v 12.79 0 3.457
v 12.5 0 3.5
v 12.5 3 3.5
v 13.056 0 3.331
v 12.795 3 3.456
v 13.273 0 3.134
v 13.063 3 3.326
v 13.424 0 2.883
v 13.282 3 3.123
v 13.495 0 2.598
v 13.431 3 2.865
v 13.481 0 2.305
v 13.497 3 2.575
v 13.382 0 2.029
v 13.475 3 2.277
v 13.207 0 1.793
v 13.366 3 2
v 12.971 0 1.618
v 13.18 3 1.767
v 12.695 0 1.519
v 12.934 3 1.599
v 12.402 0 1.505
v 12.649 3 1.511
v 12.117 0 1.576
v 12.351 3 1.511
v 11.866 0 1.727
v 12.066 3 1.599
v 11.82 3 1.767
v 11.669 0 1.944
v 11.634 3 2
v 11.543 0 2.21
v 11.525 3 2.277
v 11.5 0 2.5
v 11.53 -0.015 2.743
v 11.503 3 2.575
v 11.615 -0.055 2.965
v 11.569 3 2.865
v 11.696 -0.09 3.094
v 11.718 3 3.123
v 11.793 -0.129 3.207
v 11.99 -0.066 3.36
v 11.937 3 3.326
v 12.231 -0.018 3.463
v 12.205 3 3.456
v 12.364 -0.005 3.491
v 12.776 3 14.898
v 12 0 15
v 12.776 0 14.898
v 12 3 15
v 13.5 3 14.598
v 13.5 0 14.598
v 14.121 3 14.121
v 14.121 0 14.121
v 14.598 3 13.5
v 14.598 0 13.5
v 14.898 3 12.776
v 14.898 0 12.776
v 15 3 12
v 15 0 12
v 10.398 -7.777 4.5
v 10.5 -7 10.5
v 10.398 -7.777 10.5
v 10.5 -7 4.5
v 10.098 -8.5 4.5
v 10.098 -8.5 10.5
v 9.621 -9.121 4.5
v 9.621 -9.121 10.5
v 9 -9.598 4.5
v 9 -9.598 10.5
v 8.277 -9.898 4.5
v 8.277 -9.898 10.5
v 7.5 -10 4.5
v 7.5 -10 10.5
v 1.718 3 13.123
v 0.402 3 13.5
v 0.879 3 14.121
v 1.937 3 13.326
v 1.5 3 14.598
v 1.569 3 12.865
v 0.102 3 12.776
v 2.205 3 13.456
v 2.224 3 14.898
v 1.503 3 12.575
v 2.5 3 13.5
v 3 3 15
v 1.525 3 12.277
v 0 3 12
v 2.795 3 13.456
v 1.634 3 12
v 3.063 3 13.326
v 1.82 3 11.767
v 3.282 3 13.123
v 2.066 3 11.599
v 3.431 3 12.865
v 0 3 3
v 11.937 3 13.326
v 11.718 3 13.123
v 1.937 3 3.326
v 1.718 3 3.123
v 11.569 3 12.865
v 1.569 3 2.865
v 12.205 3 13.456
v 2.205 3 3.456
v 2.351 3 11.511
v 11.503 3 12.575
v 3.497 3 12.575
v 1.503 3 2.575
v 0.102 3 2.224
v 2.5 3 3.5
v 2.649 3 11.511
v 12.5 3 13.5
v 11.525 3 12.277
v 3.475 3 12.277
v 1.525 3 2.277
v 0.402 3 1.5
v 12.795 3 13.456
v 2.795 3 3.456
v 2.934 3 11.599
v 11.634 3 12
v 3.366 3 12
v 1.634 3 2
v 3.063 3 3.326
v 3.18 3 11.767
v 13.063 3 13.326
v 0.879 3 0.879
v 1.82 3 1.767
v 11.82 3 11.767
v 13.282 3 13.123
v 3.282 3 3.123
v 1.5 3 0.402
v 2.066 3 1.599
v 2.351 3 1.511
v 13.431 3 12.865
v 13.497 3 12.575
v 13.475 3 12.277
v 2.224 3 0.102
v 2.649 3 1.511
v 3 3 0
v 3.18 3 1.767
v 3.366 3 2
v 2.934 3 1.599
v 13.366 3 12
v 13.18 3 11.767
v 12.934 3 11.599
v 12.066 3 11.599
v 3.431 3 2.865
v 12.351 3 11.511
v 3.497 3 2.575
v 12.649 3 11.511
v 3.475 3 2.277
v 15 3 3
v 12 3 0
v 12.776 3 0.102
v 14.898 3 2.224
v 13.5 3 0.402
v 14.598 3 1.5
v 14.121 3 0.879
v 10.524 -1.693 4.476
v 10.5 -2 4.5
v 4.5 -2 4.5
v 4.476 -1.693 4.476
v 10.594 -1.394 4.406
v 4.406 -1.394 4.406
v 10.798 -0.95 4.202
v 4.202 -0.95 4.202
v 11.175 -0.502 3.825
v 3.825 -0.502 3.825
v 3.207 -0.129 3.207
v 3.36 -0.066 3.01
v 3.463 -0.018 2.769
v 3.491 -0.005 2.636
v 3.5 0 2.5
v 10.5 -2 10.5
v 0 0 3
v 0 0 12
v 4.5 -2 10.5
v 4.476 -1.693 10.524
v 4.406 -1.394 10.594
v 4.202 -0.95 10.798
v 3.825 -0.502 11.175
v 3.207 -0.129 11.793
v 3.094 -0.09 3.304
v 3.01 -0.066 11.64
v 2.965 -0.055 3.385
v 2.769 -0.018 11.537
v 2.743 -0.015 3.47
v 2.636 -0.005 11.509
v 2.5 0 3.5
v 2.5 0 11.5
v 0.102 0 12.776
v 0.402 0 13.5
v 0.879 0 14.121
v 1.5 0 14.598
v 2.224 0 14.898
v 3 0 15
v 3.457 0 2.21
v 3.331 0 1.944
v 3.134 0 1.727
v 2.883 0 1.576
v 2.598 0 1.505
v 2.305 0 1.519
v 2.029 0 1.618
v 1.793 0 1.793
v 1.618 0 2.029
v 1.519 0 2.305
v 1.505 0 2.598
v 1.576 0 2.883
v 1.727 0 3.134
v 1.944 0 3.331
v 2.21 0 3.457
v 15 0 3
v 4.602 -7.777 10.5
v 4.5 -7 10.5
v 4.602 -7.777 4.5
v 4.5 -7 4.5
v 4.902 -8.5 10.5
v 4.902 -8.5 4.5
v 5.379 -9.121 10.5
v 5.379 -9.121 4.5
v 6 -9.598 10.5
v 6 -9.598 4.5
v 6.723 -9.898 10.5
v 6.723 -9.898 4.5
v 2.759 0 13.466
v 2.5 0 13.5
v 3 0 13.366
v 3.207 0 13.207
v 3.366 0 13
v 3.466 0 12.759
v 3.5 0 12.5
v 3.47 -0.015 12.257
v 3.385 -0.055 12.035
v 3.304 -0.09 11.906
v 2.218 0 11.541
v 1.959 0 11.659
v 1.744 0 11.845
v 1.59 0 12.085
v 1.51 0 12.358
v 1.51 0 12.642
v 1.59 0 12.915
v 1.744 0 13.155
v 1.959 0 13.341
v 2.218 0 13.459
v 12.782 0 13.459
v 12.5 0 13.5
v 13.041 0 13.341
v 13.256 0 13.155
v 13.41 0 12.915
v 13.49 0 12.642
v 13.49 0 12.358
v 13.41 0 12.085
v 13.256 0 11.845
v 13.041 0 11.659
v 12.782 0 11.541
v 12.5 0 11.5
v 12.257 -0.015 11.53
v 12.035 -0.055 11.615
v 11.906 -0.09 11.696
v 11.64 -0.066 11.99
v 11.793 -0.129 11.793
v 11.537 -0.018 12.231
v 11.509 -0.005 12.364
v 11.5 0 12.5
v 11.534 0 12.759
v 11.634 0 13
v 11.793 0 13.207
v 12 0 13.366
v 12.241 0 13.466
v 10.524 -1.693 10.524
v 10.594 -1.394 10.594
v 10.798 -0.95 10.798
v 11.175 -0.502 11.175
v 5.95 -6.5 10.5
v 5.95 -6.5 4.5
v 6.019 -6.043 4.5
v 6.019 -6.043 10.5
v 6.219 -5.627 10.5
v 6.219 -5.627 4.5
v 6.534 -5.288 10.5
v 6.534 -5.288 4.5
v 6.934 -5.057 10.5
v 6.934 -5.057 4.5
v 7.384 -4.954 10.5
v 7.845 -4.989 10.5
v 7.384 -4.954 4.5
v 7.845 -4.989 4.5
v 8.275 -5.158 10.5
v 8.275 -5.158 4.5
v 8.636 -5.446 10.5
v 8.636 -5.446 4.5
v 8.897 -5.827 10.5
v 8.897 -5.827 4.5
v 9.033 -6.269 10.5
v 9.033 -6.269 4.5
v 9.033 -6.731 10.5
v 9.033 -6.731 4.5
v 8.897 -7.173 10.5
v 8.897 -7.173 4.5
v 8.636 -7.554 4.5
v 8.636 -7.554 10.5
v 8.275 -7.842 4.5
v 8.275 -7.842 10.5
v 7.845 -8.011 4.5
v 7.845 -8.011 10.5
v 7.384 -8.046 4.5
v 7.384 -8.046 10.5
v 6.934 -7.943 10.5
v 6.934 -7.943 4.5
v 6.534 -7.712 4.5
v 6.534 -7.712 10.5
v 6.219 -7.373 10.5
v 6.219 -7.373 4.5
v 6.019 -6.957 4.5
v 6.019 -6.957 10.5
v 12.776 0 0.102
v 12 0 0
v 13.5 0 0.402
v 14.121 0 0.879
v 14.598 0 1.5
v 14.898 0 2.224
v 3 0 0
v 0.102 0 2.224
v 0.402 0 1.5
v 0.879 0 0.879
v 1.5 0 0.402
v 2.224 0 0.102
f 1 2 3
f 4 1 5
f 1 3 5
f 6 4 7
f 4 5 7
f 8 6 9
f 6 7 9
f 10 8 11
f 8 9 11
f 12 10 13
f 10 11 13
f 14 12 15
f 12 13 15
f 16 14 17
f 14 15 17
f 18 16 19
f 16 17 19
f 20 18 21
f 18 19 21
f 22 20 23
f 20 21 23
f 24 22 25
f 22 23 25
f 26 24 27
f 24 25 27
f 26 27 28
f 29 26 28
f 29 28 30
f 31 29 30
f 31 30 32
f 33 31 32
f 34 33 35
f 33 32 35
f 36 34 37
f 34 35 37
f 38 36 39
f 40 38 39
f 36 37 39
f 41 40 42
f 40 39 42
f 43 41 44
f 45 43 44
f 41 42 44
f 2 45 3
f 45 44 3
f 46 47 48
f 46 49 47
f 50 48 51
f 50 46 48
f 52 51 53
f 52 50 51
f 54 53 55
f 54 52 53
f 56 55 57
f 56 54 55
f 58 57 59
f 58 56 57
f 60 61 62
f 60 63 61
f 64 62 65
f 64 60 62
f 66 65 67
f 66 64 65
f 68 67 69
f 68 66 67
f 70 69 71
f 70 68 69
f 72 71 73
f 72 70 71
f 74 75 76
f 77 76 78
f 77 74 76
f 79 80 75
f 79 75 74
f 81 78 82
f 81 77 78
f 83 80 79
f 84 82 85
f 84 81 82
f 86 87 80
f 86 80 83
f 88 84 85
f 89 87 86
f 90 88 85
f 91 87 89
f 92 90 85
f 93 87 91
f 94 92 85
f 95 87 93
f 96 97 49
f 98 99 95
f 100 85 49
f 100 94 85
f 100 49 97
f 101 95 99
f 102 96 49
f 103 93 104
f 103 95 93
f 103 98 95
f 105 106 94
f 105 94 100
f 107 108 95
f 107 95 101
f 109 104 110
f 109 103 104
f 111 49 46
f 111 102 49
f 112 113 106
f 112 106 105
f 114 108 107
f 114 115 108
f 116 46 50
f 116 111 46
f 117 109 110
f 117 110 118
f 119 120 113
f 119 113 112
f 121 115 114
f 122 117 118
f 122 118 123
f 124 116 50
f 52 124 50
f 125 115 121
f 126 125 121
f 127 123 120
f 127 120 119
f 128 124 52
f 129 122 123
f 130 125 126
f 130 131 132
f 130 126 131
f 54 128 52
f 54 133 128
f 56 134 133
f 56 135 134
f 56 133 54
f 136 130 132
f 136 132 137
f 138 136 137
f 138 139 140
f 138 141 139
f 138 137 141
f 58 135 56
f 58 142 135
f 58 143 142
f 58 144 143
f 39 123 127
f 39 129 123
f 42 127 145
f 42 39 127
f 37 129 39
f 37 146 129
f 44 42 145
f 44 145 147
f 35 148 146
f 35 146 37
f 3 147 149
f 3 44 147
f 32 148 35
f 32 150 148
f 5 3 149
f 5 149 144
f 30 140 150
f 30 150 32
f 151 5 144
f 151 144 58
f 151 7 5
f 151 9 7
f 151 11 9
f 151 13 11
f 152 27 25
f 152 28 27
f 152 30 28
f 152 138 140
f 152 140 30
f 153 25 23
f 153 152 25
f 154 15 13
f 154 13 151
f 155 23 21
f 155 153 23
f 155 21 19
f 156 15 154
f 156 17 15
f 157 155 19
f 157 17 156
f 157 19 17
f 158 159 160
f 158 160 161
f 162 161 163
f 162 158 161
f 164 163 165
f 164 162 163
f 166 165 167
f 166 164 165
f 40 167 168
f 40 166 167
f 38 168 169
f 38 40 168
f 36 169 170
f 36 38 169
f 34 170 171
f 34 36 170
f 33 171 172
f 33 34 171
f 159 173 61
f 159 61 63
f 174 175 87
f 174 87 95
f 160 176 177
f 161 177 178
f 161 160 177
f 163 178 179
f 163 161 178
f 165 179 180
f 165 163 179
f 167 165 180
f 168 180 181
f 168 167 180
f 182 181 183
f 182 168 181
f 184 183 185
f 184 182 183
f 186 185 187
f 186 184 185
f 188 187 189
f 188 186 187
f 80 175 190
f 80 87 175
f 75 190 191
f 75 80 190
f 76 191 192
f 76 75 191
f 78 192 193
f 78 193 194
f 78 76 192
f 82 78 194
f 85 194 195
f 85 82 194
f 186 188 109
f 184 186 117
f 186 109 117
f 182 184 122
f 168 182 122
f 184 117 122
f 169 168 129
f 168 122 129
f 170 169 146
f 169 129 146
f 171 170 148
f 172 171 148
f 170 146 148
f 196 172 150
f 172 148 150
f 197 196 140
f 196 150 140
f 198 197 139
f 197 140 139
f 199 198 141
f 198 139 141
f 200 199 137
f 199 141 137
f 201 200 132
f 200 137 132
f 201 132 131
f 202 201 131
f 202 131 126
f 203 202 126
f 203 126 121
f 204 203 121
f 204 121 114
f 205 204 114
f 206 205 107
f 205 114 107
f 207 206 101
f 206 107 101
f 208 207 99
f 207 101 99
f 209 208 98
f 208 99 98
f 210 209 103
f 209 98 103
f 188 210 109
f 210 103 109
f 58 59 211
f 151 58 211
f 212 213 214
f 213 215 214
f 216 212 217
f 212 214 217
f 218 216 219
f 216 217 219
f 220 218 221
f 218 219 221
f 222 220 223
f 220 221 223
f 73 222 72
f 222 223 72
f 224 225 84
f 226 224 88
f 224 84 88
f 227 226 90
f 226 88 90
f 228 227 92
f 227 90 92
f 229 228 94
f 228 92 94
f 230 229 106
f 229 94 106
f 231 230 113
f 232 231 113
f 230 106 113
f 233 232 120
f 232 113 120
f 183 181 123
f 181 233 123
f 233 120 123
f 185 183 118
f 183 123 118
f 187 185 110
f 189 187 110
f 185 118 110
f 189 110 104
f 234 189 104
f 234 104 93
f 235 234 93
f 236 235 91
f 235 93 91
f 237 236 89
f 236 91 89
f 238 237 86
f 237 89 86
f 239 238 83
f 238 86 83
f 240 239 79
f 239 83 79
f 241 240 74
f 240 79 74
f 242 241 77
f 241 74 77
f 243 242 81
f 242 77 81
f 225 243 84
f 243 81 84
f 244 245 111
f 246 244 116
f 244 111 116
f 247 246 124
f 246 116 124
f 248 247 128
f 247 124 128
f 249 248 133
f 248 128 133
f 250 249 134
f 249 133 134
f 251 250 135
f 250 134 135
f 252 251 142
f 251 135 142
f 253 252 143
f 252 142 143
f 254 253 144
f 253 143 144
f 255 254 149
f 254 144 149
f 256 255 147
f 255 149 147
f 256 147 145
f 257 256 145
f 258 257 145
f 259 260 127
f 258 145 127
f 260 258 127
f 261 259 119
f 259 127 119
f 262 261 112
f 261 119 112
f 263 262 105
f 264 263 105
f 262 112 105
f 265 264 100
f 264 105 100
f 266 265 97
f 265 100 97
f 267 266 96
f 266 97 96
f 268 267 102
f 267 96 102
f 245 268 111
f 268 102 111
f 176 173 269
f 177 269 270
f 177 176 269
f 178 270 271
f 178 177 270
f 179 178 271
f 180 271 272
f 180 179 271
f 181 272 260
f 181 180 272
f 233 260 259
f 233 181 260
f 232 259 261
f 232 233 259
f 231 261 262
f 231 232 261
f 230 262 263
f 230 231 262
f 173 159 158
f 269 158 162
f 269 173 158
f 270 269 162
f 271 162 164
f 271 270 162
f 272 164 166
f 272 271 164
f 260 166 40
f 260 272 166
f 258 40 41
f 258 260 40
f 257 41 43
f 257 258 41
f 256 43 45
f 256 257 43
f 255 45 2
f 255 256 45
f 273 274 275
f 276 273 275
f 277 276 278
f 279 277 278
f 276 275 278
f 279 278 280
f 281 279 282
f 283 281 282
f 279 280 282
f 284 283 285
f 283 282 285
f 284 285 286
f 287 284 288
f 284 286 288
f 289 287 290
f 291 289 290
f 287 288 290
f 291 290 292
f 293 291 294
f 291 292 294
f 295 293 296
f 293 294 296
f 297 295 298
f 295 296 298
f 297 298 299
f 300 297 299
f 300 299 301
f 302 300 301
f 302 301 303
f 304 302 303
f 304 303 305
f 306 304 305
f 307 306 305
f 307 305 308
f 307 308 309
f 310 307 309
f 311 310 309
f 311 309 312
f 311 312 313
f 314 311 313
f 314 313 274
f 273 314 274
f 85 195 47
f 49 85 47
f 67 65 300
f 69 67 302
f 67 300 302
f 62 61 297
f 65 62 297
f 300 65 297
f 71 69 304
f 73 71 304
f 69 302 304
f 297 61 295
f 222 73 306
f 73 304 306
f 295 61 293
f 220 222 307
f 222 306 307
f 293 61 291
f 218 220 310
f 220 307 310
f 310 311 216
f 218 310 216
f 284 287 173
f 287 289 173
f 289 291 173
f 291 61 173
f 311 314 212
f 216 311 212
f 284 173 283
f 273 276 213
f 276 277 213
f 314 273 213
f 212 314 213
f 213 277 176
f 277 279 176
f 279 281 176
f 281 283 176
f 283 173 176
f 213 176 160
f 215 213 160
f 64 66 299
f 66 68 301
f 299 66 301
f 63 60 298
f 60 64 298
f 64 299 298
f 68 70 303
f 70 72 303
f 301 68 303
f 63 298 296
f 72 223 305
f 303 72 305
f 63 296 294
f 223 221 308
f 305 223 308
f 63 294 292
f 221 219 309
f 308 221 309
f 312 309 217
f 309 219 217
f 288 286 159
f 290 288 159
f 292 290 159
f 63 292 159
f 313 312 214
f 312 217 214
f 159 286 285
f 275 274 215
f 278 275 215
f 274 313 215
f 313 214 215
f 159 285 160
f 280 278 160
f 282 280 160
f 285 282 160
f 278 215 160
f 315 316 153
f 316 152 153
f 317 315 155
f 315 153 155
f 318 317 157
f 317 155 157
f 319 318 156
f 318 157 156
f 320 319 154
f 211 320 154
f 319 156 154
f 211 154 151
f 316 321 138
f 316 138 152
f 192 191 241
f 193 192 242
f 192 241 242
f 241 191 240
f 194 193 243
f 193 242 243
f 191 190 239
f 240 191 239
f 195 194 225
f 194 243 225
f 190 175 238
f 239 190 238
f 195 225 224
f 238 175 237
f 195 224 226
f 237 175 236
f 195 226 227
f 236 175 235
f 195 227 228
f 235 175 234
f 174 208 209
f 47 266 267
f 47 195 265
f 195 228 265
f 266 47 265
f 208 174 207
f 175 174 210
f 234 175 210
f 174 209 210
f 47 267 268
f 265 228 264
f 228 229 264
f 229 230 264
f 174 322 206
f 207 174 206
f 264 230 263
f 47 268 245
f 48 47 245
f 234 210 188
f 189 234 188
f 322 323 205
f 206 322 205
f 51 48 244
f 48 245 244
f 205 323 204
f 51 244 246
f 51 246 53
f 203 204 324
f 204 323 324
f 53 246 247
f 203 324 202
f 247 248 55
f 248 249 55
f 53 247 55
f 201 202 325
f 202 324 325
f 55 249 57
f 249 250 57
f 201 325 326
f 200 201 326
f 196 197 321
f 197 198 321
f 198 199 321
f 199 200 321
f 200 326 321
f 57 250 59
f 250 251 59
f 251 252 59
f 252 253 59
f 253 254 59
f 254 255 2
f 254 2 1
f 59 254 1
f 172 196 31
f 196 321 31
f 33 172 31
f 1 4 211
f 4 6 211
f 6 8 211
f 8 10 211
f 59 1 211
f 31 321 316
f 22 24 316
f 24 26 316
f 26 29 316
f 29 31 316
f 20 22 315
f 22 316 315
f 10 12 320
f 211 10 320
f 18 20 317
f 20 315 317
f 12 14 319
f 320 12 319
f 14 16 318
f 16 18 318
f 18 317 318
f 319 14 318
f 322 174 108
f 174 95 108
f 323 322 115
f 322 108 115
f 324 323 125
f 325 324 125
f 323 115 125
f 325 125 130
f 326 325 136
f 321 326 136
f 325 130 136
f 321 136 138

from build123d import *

# Parameters (mm, degrees)
SKETCH1_W           = 15
SKETCH1_H           = 15
BOSS_EXTRUDE1_DEPTH = 3
SKETCH3_R           = 1
CUT_EXTRUDE1_DEPTH  = 22.424285286
FILLET1_R           = 3
SKETCH4_W           = 6
SKETCH4_H           = 6
BOSS_EXTRUDE2_DEPTH = 10
SKETCH5_R           = 1.55
CUT_EXTRUDE2_DEPTH  = 21.862646045
FILLET2_R           = 3
FILLET3_R           = 2


# Some blends are built 0.0001 mm under size
with BuildPart() as part:
    # Sketch1 → Boss-Extrude1 (new body)
    with BuildSketch(Plane(origin=(0, 0, 0), x_dir=(1, 0, 0), z_dir=(0, 1, 0))):
        with Locations((7.5, -7.5)):
            Rectangle(SKETCH1_W, SKETCH1_H)
    extrude(amount=BOSS_EXTRUDE1_DEPTH)

    # Sketch3 → Cut-Extrude1 (cut, through all)
    with BuildSketch(Plane(origin=(0, 3, 0), x_dir=(1, 0, 0), z_dir=(0, 1, 0))):
        with Locations(Location((2.5, -12.5, 0), (0, 0, 270))):
            Circle(SKETCH3_R)
        with Locations(Location((12.5, -12.5, 0), (0, 0, 270))):
            Circle(SKETCH3_R)
        with Locations(Location((12.5, -2.5, 0), (0, 0, 270))):
            Circle(SKETCH3_R)
        with Locations(Location((2.5, -2.5, 0), (0, 0, 270))):
            Circle(SKETCH3_R)
    extrude(amount=-CUT_EXTRUDE1_DEPTH, mode=Mode.SUBTRACT)

    # Fillet1
    fillet1_edges = [part.edges().sort_by_distance(p)[0] for p in [
        (0, 1.5, 0),
        (15, 1.5, 0),
        (15, 1.5, 15),
        (0, 1.5, 15),
    ]]
    fillet(fillet1_edges, radius=FILLET1_R)

    # Sketch4 → Boss-Extrude2 (add)
    with BuildSketch(Plane(origin=(0, 0, 0), x_dir=(-1, 0, 0), z_dir=(0, -1, 0))):
        with Locations((-7.5, -7.5)):
            Rectangle(SKETCH4_W, SKETCH4_H)
    extrude(amount=BOSS_EXTRUDE2_DEPTH)

    # Sketch5 → Cut-Extrude2 (cut, through all)
    with BuildSketch(Plane(origin=(0, 0, 4.5), x_dir=(-1, 0, 0), z_dir=(0, 0, -1))):
        with Locations((-7.5, -6.5)):
            Circle(SKETCH5_R)
    extrude(amount=-CUT_EXTRUDE2_DEPTH, mode=Mode.SUBTRACT)

    # Fillet2
    fillet2_edges = [part.edges().sort_by_distance(p)[0] for p in [
        (10.5, -10, 7.5),
        (4.5, -10, 7.5),
    ]]
    fillet(fillet2_edges, radius=FILLET2_R - 0.0001)  # a hair under: the kernel refuses the full size

    # Fillet3
    # the kernel refuses this fillet: 2 mm, written as the material it adds along each edge
    with BuildSketch(Plane(origin=(10.5, 0, 10.5), x_dir=(0, -1, 0), z_dir=(0, 0, -1)), Plane(origin=(4.5, 0, 10.5), x_dir=(0, -1, 0), z_dir=(1, 0, 0))) as fillet3_piece_1:
        with BuildLine():
            CenterArc((FILLET3_R, -FILLET3_R), FILLET3_R, 90, 90)
            Line((0, -FILLET3_R), (0, 0))
            Line((0, 0), (FILLET3_R, 0))
        make_face()
    extrude(amount=6)
    with BuildSketch(Plane(origin=(4.5, 0, 4.5), x_dir=(-1, 0, 0), z_dir=(0, 0, 1)), Plane(origin=(10.5, 0, 4.5), x_dir=(0, 0, -1), z_dir=(-1, 0, 0))) as fillet3_piece_2:
        with BuildLine():
            CenterArc((FILLET3_R, FILLET3_R), FILLET3_R, 180, 90)
            Line((0, FILLET3_R), (0, 0))
            Line((0, 0), (FILLET3_R, 0))
        make_face()
    extrude(amount=6)
    with BuildSketch(Plane(origin=(10.5, 0, 15.5), x_dir=(0, -1, 0), z_dir=(0, 0, -1))) as fillet3_piece_3a_section:
        with BuildLine():
            CenterArc((FILLET3_R, -FILLET3_R), FILLET3_R, 90, 90)
            Line((0, -FILLET3_R), (0, 0))
            Line((0, 0), (FILLET3_R, 0))
        make_face()
    fillet3_piece_3a = extrude(amount=11, mode=Mode.PRIVATE)
    fillet3_piece_3a = split(fillet3_piece_3a, bisect_by=Plane(origin=(10.928031961, -0.460476413, 10.5), z_dir=(0, 0, 1)), keep=Keep.TOP, mode=Mode.PRIVATE)
    fillet3_piece_3a = fillet3_piece_3a & Plane(origin=(12, -0.460476413, 12), x_dir=(1, 0, 0), z_dir=(0, 1, 0)) * Cylinder(3, 30, mode=Mode.PRIVATE)
    fillet3_piece_3a = fillet3_piece_3a - Plane(origin=(12.5, -0.460476413, 12.5), x_dir=(0, 0, 1), z_dir=(0, 1, 0)) * Cylinder(1, 30, mode=Mode.PRIVATE)
    with BuildSketch(Plane(origin=(4.5, 0, 10.5), x_dir=(0, -1, 0), z_dir=(1, 0, 0))) as fillet3_piece_3b_section:
        with BuildLine():
            CenterArc((FILLET3_R, -FILLET3_R), FILLET3_R, 90, 90)
            Line((0, -FILLET3_R), (0, 0))
            Line((0, 0), (FILLET3_R, 0))
        make_face()
    fillet3_piece_3b = extrude(amount=11, mode=Mode.PRIVATE)
    fillet3_piece_3b = split(fillet3_piece_3b, bisect_by=Plane(origin=(10.5, -0.460476368, 10.928032026), z_dir=(1, 0, 0)), keep=Keep.TOP, mode=Mode.PRIVATE)
    fillet3_piece_3b = fillet3_piece_3b & Plane(origin=(12, -0.460476368, 12), x_dir=(1, 0, 0), z_dir=(0, 1, 0)) * Cylinder(3, 31, mode=Mode.PRIVATE)
    fillet3_piece_3b = fillet3_piece_3b - Plane(origin=(12.5, -0.460476368, 12.5), x_dir=(0, 0, 1), z_dir=(0, 1, 0)) * Cylinder(1, 31, mode=Mode.PRIVATE)
    fillet3_piece_3 = fillet3_piece_3a & fillet3_piece_3b
    add(fillet3_piece_3)
    with BuildSketch(Plane(origin=(10.5, 0, 10.5), x_dir=(0, -1, 0), z_dir=(0, 0, -1))) as fillet3_piece_4a_section:
        with BuildLine():
            CenterArc((FILLET3_R, -FILLET3_R), FILLET3_R, 90, 90)
            Line((0, -FILLET3_R), (0, 0))
            Line((0, 0), (FILLET3_R, 0))
        make_face()
    fillet3_piece_4a = extrude(amount=11, mode=Mode.PRIVATE)
    fillet3_piece_4a = split(fillet3_piece_4a, bisect_by=Plane(origin=(10.928032026, -0.460476368, 4.5), z_dir=(0, 0, -1)), keep=Keep.TOP, mode=Mode.PRIVATE)
    fillet3_piece_4a = fillet3_piece_4a & Plane(origin=(12, -0.460476368, 3), x_dir=(0, 0, -1), z_dir=(0, 1, 0)) * Cylinder(3, 30, mode=Mode.PRIVATE)
    fillet3_piece_4a = fillet3_piece_4a - Plane(origin=(12.5, -0.460476368, 2.5), x_dir=(0, 0, 1), z_dir=(0, 1, 0)) * Cylinder(1, 30, mode=Mode.PRIVATE)
    with BuildSketch(Plane(origin=(15.5, 0, 4.5), x_dir=(0, 0, -1), z_dir=(-1, 0, 0))) as fillet3_piece_4b_section:
        with BuildLine():
            CenterArc((FILLET3_R, FILLET3_R), FILLET3_R, 180, 90)
            Line((0, FILLET3_R), (0, 0))
            Line((0, 0), (FILLET3_R, 0))
        make_face()
    fillet3_piece_4b = extrude(amount=11, mode=Mode.PRIVATE)
    fillet3_piece_4b = split(fillet3_piece_4b, bisect_by=Plane(origin=(10.5, -0.460476818, 4.071968325), z_dir=(1, 0, 0)), keep=Keep.TOP, mode=Mode.PRIVATE)
    fillet3_piece_4b = fillet3_piece_4b & Plane(origin=(12, -0.460476818, 3), x_dir=(0, 0, -1), z_dir=(0, 1, 0)) * Cylinder(3, 30, mode=Mode.PRIVATE)
    fillet3_piece_4b = fillet3_piece_4b - Plane(origin=(12.5, -0.460476818, 2.5), x_dir=(0, 0, 1), z_dir=(0, 1, 0)) * Cylinder(1, 30, mode=Mode.PRIVATE)
    fillet3_piece_4 = fillet3_piece_4a & fillet3_piece_4b
    add(fillet3_piece_4)
    with BuildSketch(Plane(origin=(-0.5, 0, 10.5), x_dir=(0, -1, 0), z_dir=(1, 0, 0))) as fillet3_piece_5a_section:
        with BuildLine():
            CenterArc((FILLET3_R, -FILLET3_R), FILLET3_R, 90, 90)
            Line((0, -FILLET3_R), (0, 0))
            Line((0, 0), (FILLET3_R, 0))
        make_face()
    fillet3_piece_5a = extrude(amount=11, mode=Mode.PRIVATE)
    fillet3_piece_5a = split(fillet3_piece_5a, bisect_by=Plane(origin=(4.5, -0.460476374, 10.928031998), z_dir=(-1, 0, 0)), keep=Keep.TOP, mode=Mode.PRIVATE)
    fillet3_piece_5a = fillet3_piece_5a & Plane(origin=(3, -0.460476374, 12), x_dir=(-1, 0, 0), z_dir=(0, 1, 0)) * Cylinder(3, 30, mode=Mode.PRIVATE)
    fillet3_piece_5a = fillet3_piece_5a - Plane(origin=(2.5, -0.460476374, 12.5), x_dir=(0, 0, 1), z_dir=(0, 1, 0)) * Cylinder(1, 30, mode=Mode.PRIVATE)
    with BuildSketch(Plane(origin=(4.5, 0, 4.5), x_dir=(-1, 0, 0), z_dir=(0, 0, 1))) as fillet3_piece_5b_section:
        with BuildLine():
            CenterArc((FILLET3_R, FILLET3_R), FILLET3_R, 180, 90)
            Line((0, FILLET3_R), (0, 0))
            Line((0, 0), (FILLET3_R, 0))
        make_face()
    fillet3_piece_5b = extrude(amount=11, mode=Mode.PRIVATE)
    fillet3_piece_5b = split(fillet3_piece_5b, bisect_by=Plane(origin=(4.071967841, -0.460476686, 10.5), z_dir=(0, 0, 1)), keep=Keep.TOP, mode=Mode.PRIVATE)
    fillet3_piece_5b = fillet3_piece_5b & Plane(origin=(3, -0.460476686, 12), x_dir=(-1, 0, 0), z_dir=(0, 1, 0)) * Cylinder(3, 30, mode=Mode.PRIVATE)
    fillet3_piece_5b = fillet3_piece_5b - Plane(origin=(2.5, -0.460476686, 12.5), x_dir=(0, 0, 1), z_dir=(0, 1, 0)) * Cylinder(1, 30, mode=Mode.PRIVATE)
    fillet3_piece_5 = fillet3_piece_5a & fillet3_piece_5b
    add(fillet3_piece_5)
    with BuildSketch(Plane(origin=(4.5, 0, -0.5), x_dir=(-1, 0, 0), z_dir=(0, 0, 1))) as fillet3_piece_6a_section:
        with BuildLine():
            CenterArc((FILLET3_R, FILLET3_R), FILLET3_R, 180, 90)
            Line((0, FILLET3_R), (0, 0))
            Line((0, 0), (FILLET3_R, 0))
        make_face()
    fillet3_piece_6a = extrude(amount=11, mode=Mode.PRIVATE)
    fillet3_piece_6a = fillet3_piece_6a & Plane(origin=(3, -0.460476683, 3), x_dir=(0, 0, -1), z_dir=(0, 1, 0)) * Cylinder(3, 30, mode=Mode.PRIVATE)
    fillet3_piece_6a = fillet3_piece_6a - Plane(origin=(2.5, -0.460476683, 2.5), x_dir=(0, 0, 1), z_dir=(0, 1, 0)) * Cylinder(1, 30, mode=Mode.PRIVATE)
    fillet3_piece_6a = split(fillet3_piece_6a, bisect_by=Plane(origin=(4.071967813, -0.460476683, 4.5), z_dir=(0, 0, -1)), keep=Keep.TOP, mode=Mode.PRIVATE)
    with BuildSketch(Plane(origin=(10.5, 0, 4.5), x_dir=(0, 0, -1), z_dir=(-1, 0, 0))) as fillet3_piece_6b_section:
        with BuildLine():
            CenterArc((FILLET3_R, FILLET3_R), FILLET3_R, 180, 90)
            Line((0, FILLET3_R), (0, 0))
            Line((0, 0), (FILLET3_R, 0))
        make_face()
    fillet3_piece_6b = extrude(amount=11, mode=Mode.PRIVATE)
    fillet3_piece_6b = fillet3_piece_6b & Plane(origin=(3, -0.460476796, 3), x_dir=(0, 0, -1), z_dir=(0, 1, 0)) * Cylinder(3, 30, mode=Mode.PRIVATE)
    fillet3_piece_6b = fillet3_piece_6b - Plane(origin=(2.5, -0.460476796, 2.5), x_dir=(0, 0, 1), z_dir=(0, 1, 0)) * Cylinder(1, 30, mode=Mode.PRIVATE)
    fillet3_piece_6b = split(fillet3_piece_6b, bisect_by=Plane(origin=(4.5, -0.460476796, 4.071968238), z_dir=(-1, 0, 0)), keep=Keep.TOP, mode=Mode.PRIVATE)
    fillet3_piece_6 = fillet3_piece_6a & fillet3_piece_6b
    add(fillet3_piece_6)


solid = part.part
